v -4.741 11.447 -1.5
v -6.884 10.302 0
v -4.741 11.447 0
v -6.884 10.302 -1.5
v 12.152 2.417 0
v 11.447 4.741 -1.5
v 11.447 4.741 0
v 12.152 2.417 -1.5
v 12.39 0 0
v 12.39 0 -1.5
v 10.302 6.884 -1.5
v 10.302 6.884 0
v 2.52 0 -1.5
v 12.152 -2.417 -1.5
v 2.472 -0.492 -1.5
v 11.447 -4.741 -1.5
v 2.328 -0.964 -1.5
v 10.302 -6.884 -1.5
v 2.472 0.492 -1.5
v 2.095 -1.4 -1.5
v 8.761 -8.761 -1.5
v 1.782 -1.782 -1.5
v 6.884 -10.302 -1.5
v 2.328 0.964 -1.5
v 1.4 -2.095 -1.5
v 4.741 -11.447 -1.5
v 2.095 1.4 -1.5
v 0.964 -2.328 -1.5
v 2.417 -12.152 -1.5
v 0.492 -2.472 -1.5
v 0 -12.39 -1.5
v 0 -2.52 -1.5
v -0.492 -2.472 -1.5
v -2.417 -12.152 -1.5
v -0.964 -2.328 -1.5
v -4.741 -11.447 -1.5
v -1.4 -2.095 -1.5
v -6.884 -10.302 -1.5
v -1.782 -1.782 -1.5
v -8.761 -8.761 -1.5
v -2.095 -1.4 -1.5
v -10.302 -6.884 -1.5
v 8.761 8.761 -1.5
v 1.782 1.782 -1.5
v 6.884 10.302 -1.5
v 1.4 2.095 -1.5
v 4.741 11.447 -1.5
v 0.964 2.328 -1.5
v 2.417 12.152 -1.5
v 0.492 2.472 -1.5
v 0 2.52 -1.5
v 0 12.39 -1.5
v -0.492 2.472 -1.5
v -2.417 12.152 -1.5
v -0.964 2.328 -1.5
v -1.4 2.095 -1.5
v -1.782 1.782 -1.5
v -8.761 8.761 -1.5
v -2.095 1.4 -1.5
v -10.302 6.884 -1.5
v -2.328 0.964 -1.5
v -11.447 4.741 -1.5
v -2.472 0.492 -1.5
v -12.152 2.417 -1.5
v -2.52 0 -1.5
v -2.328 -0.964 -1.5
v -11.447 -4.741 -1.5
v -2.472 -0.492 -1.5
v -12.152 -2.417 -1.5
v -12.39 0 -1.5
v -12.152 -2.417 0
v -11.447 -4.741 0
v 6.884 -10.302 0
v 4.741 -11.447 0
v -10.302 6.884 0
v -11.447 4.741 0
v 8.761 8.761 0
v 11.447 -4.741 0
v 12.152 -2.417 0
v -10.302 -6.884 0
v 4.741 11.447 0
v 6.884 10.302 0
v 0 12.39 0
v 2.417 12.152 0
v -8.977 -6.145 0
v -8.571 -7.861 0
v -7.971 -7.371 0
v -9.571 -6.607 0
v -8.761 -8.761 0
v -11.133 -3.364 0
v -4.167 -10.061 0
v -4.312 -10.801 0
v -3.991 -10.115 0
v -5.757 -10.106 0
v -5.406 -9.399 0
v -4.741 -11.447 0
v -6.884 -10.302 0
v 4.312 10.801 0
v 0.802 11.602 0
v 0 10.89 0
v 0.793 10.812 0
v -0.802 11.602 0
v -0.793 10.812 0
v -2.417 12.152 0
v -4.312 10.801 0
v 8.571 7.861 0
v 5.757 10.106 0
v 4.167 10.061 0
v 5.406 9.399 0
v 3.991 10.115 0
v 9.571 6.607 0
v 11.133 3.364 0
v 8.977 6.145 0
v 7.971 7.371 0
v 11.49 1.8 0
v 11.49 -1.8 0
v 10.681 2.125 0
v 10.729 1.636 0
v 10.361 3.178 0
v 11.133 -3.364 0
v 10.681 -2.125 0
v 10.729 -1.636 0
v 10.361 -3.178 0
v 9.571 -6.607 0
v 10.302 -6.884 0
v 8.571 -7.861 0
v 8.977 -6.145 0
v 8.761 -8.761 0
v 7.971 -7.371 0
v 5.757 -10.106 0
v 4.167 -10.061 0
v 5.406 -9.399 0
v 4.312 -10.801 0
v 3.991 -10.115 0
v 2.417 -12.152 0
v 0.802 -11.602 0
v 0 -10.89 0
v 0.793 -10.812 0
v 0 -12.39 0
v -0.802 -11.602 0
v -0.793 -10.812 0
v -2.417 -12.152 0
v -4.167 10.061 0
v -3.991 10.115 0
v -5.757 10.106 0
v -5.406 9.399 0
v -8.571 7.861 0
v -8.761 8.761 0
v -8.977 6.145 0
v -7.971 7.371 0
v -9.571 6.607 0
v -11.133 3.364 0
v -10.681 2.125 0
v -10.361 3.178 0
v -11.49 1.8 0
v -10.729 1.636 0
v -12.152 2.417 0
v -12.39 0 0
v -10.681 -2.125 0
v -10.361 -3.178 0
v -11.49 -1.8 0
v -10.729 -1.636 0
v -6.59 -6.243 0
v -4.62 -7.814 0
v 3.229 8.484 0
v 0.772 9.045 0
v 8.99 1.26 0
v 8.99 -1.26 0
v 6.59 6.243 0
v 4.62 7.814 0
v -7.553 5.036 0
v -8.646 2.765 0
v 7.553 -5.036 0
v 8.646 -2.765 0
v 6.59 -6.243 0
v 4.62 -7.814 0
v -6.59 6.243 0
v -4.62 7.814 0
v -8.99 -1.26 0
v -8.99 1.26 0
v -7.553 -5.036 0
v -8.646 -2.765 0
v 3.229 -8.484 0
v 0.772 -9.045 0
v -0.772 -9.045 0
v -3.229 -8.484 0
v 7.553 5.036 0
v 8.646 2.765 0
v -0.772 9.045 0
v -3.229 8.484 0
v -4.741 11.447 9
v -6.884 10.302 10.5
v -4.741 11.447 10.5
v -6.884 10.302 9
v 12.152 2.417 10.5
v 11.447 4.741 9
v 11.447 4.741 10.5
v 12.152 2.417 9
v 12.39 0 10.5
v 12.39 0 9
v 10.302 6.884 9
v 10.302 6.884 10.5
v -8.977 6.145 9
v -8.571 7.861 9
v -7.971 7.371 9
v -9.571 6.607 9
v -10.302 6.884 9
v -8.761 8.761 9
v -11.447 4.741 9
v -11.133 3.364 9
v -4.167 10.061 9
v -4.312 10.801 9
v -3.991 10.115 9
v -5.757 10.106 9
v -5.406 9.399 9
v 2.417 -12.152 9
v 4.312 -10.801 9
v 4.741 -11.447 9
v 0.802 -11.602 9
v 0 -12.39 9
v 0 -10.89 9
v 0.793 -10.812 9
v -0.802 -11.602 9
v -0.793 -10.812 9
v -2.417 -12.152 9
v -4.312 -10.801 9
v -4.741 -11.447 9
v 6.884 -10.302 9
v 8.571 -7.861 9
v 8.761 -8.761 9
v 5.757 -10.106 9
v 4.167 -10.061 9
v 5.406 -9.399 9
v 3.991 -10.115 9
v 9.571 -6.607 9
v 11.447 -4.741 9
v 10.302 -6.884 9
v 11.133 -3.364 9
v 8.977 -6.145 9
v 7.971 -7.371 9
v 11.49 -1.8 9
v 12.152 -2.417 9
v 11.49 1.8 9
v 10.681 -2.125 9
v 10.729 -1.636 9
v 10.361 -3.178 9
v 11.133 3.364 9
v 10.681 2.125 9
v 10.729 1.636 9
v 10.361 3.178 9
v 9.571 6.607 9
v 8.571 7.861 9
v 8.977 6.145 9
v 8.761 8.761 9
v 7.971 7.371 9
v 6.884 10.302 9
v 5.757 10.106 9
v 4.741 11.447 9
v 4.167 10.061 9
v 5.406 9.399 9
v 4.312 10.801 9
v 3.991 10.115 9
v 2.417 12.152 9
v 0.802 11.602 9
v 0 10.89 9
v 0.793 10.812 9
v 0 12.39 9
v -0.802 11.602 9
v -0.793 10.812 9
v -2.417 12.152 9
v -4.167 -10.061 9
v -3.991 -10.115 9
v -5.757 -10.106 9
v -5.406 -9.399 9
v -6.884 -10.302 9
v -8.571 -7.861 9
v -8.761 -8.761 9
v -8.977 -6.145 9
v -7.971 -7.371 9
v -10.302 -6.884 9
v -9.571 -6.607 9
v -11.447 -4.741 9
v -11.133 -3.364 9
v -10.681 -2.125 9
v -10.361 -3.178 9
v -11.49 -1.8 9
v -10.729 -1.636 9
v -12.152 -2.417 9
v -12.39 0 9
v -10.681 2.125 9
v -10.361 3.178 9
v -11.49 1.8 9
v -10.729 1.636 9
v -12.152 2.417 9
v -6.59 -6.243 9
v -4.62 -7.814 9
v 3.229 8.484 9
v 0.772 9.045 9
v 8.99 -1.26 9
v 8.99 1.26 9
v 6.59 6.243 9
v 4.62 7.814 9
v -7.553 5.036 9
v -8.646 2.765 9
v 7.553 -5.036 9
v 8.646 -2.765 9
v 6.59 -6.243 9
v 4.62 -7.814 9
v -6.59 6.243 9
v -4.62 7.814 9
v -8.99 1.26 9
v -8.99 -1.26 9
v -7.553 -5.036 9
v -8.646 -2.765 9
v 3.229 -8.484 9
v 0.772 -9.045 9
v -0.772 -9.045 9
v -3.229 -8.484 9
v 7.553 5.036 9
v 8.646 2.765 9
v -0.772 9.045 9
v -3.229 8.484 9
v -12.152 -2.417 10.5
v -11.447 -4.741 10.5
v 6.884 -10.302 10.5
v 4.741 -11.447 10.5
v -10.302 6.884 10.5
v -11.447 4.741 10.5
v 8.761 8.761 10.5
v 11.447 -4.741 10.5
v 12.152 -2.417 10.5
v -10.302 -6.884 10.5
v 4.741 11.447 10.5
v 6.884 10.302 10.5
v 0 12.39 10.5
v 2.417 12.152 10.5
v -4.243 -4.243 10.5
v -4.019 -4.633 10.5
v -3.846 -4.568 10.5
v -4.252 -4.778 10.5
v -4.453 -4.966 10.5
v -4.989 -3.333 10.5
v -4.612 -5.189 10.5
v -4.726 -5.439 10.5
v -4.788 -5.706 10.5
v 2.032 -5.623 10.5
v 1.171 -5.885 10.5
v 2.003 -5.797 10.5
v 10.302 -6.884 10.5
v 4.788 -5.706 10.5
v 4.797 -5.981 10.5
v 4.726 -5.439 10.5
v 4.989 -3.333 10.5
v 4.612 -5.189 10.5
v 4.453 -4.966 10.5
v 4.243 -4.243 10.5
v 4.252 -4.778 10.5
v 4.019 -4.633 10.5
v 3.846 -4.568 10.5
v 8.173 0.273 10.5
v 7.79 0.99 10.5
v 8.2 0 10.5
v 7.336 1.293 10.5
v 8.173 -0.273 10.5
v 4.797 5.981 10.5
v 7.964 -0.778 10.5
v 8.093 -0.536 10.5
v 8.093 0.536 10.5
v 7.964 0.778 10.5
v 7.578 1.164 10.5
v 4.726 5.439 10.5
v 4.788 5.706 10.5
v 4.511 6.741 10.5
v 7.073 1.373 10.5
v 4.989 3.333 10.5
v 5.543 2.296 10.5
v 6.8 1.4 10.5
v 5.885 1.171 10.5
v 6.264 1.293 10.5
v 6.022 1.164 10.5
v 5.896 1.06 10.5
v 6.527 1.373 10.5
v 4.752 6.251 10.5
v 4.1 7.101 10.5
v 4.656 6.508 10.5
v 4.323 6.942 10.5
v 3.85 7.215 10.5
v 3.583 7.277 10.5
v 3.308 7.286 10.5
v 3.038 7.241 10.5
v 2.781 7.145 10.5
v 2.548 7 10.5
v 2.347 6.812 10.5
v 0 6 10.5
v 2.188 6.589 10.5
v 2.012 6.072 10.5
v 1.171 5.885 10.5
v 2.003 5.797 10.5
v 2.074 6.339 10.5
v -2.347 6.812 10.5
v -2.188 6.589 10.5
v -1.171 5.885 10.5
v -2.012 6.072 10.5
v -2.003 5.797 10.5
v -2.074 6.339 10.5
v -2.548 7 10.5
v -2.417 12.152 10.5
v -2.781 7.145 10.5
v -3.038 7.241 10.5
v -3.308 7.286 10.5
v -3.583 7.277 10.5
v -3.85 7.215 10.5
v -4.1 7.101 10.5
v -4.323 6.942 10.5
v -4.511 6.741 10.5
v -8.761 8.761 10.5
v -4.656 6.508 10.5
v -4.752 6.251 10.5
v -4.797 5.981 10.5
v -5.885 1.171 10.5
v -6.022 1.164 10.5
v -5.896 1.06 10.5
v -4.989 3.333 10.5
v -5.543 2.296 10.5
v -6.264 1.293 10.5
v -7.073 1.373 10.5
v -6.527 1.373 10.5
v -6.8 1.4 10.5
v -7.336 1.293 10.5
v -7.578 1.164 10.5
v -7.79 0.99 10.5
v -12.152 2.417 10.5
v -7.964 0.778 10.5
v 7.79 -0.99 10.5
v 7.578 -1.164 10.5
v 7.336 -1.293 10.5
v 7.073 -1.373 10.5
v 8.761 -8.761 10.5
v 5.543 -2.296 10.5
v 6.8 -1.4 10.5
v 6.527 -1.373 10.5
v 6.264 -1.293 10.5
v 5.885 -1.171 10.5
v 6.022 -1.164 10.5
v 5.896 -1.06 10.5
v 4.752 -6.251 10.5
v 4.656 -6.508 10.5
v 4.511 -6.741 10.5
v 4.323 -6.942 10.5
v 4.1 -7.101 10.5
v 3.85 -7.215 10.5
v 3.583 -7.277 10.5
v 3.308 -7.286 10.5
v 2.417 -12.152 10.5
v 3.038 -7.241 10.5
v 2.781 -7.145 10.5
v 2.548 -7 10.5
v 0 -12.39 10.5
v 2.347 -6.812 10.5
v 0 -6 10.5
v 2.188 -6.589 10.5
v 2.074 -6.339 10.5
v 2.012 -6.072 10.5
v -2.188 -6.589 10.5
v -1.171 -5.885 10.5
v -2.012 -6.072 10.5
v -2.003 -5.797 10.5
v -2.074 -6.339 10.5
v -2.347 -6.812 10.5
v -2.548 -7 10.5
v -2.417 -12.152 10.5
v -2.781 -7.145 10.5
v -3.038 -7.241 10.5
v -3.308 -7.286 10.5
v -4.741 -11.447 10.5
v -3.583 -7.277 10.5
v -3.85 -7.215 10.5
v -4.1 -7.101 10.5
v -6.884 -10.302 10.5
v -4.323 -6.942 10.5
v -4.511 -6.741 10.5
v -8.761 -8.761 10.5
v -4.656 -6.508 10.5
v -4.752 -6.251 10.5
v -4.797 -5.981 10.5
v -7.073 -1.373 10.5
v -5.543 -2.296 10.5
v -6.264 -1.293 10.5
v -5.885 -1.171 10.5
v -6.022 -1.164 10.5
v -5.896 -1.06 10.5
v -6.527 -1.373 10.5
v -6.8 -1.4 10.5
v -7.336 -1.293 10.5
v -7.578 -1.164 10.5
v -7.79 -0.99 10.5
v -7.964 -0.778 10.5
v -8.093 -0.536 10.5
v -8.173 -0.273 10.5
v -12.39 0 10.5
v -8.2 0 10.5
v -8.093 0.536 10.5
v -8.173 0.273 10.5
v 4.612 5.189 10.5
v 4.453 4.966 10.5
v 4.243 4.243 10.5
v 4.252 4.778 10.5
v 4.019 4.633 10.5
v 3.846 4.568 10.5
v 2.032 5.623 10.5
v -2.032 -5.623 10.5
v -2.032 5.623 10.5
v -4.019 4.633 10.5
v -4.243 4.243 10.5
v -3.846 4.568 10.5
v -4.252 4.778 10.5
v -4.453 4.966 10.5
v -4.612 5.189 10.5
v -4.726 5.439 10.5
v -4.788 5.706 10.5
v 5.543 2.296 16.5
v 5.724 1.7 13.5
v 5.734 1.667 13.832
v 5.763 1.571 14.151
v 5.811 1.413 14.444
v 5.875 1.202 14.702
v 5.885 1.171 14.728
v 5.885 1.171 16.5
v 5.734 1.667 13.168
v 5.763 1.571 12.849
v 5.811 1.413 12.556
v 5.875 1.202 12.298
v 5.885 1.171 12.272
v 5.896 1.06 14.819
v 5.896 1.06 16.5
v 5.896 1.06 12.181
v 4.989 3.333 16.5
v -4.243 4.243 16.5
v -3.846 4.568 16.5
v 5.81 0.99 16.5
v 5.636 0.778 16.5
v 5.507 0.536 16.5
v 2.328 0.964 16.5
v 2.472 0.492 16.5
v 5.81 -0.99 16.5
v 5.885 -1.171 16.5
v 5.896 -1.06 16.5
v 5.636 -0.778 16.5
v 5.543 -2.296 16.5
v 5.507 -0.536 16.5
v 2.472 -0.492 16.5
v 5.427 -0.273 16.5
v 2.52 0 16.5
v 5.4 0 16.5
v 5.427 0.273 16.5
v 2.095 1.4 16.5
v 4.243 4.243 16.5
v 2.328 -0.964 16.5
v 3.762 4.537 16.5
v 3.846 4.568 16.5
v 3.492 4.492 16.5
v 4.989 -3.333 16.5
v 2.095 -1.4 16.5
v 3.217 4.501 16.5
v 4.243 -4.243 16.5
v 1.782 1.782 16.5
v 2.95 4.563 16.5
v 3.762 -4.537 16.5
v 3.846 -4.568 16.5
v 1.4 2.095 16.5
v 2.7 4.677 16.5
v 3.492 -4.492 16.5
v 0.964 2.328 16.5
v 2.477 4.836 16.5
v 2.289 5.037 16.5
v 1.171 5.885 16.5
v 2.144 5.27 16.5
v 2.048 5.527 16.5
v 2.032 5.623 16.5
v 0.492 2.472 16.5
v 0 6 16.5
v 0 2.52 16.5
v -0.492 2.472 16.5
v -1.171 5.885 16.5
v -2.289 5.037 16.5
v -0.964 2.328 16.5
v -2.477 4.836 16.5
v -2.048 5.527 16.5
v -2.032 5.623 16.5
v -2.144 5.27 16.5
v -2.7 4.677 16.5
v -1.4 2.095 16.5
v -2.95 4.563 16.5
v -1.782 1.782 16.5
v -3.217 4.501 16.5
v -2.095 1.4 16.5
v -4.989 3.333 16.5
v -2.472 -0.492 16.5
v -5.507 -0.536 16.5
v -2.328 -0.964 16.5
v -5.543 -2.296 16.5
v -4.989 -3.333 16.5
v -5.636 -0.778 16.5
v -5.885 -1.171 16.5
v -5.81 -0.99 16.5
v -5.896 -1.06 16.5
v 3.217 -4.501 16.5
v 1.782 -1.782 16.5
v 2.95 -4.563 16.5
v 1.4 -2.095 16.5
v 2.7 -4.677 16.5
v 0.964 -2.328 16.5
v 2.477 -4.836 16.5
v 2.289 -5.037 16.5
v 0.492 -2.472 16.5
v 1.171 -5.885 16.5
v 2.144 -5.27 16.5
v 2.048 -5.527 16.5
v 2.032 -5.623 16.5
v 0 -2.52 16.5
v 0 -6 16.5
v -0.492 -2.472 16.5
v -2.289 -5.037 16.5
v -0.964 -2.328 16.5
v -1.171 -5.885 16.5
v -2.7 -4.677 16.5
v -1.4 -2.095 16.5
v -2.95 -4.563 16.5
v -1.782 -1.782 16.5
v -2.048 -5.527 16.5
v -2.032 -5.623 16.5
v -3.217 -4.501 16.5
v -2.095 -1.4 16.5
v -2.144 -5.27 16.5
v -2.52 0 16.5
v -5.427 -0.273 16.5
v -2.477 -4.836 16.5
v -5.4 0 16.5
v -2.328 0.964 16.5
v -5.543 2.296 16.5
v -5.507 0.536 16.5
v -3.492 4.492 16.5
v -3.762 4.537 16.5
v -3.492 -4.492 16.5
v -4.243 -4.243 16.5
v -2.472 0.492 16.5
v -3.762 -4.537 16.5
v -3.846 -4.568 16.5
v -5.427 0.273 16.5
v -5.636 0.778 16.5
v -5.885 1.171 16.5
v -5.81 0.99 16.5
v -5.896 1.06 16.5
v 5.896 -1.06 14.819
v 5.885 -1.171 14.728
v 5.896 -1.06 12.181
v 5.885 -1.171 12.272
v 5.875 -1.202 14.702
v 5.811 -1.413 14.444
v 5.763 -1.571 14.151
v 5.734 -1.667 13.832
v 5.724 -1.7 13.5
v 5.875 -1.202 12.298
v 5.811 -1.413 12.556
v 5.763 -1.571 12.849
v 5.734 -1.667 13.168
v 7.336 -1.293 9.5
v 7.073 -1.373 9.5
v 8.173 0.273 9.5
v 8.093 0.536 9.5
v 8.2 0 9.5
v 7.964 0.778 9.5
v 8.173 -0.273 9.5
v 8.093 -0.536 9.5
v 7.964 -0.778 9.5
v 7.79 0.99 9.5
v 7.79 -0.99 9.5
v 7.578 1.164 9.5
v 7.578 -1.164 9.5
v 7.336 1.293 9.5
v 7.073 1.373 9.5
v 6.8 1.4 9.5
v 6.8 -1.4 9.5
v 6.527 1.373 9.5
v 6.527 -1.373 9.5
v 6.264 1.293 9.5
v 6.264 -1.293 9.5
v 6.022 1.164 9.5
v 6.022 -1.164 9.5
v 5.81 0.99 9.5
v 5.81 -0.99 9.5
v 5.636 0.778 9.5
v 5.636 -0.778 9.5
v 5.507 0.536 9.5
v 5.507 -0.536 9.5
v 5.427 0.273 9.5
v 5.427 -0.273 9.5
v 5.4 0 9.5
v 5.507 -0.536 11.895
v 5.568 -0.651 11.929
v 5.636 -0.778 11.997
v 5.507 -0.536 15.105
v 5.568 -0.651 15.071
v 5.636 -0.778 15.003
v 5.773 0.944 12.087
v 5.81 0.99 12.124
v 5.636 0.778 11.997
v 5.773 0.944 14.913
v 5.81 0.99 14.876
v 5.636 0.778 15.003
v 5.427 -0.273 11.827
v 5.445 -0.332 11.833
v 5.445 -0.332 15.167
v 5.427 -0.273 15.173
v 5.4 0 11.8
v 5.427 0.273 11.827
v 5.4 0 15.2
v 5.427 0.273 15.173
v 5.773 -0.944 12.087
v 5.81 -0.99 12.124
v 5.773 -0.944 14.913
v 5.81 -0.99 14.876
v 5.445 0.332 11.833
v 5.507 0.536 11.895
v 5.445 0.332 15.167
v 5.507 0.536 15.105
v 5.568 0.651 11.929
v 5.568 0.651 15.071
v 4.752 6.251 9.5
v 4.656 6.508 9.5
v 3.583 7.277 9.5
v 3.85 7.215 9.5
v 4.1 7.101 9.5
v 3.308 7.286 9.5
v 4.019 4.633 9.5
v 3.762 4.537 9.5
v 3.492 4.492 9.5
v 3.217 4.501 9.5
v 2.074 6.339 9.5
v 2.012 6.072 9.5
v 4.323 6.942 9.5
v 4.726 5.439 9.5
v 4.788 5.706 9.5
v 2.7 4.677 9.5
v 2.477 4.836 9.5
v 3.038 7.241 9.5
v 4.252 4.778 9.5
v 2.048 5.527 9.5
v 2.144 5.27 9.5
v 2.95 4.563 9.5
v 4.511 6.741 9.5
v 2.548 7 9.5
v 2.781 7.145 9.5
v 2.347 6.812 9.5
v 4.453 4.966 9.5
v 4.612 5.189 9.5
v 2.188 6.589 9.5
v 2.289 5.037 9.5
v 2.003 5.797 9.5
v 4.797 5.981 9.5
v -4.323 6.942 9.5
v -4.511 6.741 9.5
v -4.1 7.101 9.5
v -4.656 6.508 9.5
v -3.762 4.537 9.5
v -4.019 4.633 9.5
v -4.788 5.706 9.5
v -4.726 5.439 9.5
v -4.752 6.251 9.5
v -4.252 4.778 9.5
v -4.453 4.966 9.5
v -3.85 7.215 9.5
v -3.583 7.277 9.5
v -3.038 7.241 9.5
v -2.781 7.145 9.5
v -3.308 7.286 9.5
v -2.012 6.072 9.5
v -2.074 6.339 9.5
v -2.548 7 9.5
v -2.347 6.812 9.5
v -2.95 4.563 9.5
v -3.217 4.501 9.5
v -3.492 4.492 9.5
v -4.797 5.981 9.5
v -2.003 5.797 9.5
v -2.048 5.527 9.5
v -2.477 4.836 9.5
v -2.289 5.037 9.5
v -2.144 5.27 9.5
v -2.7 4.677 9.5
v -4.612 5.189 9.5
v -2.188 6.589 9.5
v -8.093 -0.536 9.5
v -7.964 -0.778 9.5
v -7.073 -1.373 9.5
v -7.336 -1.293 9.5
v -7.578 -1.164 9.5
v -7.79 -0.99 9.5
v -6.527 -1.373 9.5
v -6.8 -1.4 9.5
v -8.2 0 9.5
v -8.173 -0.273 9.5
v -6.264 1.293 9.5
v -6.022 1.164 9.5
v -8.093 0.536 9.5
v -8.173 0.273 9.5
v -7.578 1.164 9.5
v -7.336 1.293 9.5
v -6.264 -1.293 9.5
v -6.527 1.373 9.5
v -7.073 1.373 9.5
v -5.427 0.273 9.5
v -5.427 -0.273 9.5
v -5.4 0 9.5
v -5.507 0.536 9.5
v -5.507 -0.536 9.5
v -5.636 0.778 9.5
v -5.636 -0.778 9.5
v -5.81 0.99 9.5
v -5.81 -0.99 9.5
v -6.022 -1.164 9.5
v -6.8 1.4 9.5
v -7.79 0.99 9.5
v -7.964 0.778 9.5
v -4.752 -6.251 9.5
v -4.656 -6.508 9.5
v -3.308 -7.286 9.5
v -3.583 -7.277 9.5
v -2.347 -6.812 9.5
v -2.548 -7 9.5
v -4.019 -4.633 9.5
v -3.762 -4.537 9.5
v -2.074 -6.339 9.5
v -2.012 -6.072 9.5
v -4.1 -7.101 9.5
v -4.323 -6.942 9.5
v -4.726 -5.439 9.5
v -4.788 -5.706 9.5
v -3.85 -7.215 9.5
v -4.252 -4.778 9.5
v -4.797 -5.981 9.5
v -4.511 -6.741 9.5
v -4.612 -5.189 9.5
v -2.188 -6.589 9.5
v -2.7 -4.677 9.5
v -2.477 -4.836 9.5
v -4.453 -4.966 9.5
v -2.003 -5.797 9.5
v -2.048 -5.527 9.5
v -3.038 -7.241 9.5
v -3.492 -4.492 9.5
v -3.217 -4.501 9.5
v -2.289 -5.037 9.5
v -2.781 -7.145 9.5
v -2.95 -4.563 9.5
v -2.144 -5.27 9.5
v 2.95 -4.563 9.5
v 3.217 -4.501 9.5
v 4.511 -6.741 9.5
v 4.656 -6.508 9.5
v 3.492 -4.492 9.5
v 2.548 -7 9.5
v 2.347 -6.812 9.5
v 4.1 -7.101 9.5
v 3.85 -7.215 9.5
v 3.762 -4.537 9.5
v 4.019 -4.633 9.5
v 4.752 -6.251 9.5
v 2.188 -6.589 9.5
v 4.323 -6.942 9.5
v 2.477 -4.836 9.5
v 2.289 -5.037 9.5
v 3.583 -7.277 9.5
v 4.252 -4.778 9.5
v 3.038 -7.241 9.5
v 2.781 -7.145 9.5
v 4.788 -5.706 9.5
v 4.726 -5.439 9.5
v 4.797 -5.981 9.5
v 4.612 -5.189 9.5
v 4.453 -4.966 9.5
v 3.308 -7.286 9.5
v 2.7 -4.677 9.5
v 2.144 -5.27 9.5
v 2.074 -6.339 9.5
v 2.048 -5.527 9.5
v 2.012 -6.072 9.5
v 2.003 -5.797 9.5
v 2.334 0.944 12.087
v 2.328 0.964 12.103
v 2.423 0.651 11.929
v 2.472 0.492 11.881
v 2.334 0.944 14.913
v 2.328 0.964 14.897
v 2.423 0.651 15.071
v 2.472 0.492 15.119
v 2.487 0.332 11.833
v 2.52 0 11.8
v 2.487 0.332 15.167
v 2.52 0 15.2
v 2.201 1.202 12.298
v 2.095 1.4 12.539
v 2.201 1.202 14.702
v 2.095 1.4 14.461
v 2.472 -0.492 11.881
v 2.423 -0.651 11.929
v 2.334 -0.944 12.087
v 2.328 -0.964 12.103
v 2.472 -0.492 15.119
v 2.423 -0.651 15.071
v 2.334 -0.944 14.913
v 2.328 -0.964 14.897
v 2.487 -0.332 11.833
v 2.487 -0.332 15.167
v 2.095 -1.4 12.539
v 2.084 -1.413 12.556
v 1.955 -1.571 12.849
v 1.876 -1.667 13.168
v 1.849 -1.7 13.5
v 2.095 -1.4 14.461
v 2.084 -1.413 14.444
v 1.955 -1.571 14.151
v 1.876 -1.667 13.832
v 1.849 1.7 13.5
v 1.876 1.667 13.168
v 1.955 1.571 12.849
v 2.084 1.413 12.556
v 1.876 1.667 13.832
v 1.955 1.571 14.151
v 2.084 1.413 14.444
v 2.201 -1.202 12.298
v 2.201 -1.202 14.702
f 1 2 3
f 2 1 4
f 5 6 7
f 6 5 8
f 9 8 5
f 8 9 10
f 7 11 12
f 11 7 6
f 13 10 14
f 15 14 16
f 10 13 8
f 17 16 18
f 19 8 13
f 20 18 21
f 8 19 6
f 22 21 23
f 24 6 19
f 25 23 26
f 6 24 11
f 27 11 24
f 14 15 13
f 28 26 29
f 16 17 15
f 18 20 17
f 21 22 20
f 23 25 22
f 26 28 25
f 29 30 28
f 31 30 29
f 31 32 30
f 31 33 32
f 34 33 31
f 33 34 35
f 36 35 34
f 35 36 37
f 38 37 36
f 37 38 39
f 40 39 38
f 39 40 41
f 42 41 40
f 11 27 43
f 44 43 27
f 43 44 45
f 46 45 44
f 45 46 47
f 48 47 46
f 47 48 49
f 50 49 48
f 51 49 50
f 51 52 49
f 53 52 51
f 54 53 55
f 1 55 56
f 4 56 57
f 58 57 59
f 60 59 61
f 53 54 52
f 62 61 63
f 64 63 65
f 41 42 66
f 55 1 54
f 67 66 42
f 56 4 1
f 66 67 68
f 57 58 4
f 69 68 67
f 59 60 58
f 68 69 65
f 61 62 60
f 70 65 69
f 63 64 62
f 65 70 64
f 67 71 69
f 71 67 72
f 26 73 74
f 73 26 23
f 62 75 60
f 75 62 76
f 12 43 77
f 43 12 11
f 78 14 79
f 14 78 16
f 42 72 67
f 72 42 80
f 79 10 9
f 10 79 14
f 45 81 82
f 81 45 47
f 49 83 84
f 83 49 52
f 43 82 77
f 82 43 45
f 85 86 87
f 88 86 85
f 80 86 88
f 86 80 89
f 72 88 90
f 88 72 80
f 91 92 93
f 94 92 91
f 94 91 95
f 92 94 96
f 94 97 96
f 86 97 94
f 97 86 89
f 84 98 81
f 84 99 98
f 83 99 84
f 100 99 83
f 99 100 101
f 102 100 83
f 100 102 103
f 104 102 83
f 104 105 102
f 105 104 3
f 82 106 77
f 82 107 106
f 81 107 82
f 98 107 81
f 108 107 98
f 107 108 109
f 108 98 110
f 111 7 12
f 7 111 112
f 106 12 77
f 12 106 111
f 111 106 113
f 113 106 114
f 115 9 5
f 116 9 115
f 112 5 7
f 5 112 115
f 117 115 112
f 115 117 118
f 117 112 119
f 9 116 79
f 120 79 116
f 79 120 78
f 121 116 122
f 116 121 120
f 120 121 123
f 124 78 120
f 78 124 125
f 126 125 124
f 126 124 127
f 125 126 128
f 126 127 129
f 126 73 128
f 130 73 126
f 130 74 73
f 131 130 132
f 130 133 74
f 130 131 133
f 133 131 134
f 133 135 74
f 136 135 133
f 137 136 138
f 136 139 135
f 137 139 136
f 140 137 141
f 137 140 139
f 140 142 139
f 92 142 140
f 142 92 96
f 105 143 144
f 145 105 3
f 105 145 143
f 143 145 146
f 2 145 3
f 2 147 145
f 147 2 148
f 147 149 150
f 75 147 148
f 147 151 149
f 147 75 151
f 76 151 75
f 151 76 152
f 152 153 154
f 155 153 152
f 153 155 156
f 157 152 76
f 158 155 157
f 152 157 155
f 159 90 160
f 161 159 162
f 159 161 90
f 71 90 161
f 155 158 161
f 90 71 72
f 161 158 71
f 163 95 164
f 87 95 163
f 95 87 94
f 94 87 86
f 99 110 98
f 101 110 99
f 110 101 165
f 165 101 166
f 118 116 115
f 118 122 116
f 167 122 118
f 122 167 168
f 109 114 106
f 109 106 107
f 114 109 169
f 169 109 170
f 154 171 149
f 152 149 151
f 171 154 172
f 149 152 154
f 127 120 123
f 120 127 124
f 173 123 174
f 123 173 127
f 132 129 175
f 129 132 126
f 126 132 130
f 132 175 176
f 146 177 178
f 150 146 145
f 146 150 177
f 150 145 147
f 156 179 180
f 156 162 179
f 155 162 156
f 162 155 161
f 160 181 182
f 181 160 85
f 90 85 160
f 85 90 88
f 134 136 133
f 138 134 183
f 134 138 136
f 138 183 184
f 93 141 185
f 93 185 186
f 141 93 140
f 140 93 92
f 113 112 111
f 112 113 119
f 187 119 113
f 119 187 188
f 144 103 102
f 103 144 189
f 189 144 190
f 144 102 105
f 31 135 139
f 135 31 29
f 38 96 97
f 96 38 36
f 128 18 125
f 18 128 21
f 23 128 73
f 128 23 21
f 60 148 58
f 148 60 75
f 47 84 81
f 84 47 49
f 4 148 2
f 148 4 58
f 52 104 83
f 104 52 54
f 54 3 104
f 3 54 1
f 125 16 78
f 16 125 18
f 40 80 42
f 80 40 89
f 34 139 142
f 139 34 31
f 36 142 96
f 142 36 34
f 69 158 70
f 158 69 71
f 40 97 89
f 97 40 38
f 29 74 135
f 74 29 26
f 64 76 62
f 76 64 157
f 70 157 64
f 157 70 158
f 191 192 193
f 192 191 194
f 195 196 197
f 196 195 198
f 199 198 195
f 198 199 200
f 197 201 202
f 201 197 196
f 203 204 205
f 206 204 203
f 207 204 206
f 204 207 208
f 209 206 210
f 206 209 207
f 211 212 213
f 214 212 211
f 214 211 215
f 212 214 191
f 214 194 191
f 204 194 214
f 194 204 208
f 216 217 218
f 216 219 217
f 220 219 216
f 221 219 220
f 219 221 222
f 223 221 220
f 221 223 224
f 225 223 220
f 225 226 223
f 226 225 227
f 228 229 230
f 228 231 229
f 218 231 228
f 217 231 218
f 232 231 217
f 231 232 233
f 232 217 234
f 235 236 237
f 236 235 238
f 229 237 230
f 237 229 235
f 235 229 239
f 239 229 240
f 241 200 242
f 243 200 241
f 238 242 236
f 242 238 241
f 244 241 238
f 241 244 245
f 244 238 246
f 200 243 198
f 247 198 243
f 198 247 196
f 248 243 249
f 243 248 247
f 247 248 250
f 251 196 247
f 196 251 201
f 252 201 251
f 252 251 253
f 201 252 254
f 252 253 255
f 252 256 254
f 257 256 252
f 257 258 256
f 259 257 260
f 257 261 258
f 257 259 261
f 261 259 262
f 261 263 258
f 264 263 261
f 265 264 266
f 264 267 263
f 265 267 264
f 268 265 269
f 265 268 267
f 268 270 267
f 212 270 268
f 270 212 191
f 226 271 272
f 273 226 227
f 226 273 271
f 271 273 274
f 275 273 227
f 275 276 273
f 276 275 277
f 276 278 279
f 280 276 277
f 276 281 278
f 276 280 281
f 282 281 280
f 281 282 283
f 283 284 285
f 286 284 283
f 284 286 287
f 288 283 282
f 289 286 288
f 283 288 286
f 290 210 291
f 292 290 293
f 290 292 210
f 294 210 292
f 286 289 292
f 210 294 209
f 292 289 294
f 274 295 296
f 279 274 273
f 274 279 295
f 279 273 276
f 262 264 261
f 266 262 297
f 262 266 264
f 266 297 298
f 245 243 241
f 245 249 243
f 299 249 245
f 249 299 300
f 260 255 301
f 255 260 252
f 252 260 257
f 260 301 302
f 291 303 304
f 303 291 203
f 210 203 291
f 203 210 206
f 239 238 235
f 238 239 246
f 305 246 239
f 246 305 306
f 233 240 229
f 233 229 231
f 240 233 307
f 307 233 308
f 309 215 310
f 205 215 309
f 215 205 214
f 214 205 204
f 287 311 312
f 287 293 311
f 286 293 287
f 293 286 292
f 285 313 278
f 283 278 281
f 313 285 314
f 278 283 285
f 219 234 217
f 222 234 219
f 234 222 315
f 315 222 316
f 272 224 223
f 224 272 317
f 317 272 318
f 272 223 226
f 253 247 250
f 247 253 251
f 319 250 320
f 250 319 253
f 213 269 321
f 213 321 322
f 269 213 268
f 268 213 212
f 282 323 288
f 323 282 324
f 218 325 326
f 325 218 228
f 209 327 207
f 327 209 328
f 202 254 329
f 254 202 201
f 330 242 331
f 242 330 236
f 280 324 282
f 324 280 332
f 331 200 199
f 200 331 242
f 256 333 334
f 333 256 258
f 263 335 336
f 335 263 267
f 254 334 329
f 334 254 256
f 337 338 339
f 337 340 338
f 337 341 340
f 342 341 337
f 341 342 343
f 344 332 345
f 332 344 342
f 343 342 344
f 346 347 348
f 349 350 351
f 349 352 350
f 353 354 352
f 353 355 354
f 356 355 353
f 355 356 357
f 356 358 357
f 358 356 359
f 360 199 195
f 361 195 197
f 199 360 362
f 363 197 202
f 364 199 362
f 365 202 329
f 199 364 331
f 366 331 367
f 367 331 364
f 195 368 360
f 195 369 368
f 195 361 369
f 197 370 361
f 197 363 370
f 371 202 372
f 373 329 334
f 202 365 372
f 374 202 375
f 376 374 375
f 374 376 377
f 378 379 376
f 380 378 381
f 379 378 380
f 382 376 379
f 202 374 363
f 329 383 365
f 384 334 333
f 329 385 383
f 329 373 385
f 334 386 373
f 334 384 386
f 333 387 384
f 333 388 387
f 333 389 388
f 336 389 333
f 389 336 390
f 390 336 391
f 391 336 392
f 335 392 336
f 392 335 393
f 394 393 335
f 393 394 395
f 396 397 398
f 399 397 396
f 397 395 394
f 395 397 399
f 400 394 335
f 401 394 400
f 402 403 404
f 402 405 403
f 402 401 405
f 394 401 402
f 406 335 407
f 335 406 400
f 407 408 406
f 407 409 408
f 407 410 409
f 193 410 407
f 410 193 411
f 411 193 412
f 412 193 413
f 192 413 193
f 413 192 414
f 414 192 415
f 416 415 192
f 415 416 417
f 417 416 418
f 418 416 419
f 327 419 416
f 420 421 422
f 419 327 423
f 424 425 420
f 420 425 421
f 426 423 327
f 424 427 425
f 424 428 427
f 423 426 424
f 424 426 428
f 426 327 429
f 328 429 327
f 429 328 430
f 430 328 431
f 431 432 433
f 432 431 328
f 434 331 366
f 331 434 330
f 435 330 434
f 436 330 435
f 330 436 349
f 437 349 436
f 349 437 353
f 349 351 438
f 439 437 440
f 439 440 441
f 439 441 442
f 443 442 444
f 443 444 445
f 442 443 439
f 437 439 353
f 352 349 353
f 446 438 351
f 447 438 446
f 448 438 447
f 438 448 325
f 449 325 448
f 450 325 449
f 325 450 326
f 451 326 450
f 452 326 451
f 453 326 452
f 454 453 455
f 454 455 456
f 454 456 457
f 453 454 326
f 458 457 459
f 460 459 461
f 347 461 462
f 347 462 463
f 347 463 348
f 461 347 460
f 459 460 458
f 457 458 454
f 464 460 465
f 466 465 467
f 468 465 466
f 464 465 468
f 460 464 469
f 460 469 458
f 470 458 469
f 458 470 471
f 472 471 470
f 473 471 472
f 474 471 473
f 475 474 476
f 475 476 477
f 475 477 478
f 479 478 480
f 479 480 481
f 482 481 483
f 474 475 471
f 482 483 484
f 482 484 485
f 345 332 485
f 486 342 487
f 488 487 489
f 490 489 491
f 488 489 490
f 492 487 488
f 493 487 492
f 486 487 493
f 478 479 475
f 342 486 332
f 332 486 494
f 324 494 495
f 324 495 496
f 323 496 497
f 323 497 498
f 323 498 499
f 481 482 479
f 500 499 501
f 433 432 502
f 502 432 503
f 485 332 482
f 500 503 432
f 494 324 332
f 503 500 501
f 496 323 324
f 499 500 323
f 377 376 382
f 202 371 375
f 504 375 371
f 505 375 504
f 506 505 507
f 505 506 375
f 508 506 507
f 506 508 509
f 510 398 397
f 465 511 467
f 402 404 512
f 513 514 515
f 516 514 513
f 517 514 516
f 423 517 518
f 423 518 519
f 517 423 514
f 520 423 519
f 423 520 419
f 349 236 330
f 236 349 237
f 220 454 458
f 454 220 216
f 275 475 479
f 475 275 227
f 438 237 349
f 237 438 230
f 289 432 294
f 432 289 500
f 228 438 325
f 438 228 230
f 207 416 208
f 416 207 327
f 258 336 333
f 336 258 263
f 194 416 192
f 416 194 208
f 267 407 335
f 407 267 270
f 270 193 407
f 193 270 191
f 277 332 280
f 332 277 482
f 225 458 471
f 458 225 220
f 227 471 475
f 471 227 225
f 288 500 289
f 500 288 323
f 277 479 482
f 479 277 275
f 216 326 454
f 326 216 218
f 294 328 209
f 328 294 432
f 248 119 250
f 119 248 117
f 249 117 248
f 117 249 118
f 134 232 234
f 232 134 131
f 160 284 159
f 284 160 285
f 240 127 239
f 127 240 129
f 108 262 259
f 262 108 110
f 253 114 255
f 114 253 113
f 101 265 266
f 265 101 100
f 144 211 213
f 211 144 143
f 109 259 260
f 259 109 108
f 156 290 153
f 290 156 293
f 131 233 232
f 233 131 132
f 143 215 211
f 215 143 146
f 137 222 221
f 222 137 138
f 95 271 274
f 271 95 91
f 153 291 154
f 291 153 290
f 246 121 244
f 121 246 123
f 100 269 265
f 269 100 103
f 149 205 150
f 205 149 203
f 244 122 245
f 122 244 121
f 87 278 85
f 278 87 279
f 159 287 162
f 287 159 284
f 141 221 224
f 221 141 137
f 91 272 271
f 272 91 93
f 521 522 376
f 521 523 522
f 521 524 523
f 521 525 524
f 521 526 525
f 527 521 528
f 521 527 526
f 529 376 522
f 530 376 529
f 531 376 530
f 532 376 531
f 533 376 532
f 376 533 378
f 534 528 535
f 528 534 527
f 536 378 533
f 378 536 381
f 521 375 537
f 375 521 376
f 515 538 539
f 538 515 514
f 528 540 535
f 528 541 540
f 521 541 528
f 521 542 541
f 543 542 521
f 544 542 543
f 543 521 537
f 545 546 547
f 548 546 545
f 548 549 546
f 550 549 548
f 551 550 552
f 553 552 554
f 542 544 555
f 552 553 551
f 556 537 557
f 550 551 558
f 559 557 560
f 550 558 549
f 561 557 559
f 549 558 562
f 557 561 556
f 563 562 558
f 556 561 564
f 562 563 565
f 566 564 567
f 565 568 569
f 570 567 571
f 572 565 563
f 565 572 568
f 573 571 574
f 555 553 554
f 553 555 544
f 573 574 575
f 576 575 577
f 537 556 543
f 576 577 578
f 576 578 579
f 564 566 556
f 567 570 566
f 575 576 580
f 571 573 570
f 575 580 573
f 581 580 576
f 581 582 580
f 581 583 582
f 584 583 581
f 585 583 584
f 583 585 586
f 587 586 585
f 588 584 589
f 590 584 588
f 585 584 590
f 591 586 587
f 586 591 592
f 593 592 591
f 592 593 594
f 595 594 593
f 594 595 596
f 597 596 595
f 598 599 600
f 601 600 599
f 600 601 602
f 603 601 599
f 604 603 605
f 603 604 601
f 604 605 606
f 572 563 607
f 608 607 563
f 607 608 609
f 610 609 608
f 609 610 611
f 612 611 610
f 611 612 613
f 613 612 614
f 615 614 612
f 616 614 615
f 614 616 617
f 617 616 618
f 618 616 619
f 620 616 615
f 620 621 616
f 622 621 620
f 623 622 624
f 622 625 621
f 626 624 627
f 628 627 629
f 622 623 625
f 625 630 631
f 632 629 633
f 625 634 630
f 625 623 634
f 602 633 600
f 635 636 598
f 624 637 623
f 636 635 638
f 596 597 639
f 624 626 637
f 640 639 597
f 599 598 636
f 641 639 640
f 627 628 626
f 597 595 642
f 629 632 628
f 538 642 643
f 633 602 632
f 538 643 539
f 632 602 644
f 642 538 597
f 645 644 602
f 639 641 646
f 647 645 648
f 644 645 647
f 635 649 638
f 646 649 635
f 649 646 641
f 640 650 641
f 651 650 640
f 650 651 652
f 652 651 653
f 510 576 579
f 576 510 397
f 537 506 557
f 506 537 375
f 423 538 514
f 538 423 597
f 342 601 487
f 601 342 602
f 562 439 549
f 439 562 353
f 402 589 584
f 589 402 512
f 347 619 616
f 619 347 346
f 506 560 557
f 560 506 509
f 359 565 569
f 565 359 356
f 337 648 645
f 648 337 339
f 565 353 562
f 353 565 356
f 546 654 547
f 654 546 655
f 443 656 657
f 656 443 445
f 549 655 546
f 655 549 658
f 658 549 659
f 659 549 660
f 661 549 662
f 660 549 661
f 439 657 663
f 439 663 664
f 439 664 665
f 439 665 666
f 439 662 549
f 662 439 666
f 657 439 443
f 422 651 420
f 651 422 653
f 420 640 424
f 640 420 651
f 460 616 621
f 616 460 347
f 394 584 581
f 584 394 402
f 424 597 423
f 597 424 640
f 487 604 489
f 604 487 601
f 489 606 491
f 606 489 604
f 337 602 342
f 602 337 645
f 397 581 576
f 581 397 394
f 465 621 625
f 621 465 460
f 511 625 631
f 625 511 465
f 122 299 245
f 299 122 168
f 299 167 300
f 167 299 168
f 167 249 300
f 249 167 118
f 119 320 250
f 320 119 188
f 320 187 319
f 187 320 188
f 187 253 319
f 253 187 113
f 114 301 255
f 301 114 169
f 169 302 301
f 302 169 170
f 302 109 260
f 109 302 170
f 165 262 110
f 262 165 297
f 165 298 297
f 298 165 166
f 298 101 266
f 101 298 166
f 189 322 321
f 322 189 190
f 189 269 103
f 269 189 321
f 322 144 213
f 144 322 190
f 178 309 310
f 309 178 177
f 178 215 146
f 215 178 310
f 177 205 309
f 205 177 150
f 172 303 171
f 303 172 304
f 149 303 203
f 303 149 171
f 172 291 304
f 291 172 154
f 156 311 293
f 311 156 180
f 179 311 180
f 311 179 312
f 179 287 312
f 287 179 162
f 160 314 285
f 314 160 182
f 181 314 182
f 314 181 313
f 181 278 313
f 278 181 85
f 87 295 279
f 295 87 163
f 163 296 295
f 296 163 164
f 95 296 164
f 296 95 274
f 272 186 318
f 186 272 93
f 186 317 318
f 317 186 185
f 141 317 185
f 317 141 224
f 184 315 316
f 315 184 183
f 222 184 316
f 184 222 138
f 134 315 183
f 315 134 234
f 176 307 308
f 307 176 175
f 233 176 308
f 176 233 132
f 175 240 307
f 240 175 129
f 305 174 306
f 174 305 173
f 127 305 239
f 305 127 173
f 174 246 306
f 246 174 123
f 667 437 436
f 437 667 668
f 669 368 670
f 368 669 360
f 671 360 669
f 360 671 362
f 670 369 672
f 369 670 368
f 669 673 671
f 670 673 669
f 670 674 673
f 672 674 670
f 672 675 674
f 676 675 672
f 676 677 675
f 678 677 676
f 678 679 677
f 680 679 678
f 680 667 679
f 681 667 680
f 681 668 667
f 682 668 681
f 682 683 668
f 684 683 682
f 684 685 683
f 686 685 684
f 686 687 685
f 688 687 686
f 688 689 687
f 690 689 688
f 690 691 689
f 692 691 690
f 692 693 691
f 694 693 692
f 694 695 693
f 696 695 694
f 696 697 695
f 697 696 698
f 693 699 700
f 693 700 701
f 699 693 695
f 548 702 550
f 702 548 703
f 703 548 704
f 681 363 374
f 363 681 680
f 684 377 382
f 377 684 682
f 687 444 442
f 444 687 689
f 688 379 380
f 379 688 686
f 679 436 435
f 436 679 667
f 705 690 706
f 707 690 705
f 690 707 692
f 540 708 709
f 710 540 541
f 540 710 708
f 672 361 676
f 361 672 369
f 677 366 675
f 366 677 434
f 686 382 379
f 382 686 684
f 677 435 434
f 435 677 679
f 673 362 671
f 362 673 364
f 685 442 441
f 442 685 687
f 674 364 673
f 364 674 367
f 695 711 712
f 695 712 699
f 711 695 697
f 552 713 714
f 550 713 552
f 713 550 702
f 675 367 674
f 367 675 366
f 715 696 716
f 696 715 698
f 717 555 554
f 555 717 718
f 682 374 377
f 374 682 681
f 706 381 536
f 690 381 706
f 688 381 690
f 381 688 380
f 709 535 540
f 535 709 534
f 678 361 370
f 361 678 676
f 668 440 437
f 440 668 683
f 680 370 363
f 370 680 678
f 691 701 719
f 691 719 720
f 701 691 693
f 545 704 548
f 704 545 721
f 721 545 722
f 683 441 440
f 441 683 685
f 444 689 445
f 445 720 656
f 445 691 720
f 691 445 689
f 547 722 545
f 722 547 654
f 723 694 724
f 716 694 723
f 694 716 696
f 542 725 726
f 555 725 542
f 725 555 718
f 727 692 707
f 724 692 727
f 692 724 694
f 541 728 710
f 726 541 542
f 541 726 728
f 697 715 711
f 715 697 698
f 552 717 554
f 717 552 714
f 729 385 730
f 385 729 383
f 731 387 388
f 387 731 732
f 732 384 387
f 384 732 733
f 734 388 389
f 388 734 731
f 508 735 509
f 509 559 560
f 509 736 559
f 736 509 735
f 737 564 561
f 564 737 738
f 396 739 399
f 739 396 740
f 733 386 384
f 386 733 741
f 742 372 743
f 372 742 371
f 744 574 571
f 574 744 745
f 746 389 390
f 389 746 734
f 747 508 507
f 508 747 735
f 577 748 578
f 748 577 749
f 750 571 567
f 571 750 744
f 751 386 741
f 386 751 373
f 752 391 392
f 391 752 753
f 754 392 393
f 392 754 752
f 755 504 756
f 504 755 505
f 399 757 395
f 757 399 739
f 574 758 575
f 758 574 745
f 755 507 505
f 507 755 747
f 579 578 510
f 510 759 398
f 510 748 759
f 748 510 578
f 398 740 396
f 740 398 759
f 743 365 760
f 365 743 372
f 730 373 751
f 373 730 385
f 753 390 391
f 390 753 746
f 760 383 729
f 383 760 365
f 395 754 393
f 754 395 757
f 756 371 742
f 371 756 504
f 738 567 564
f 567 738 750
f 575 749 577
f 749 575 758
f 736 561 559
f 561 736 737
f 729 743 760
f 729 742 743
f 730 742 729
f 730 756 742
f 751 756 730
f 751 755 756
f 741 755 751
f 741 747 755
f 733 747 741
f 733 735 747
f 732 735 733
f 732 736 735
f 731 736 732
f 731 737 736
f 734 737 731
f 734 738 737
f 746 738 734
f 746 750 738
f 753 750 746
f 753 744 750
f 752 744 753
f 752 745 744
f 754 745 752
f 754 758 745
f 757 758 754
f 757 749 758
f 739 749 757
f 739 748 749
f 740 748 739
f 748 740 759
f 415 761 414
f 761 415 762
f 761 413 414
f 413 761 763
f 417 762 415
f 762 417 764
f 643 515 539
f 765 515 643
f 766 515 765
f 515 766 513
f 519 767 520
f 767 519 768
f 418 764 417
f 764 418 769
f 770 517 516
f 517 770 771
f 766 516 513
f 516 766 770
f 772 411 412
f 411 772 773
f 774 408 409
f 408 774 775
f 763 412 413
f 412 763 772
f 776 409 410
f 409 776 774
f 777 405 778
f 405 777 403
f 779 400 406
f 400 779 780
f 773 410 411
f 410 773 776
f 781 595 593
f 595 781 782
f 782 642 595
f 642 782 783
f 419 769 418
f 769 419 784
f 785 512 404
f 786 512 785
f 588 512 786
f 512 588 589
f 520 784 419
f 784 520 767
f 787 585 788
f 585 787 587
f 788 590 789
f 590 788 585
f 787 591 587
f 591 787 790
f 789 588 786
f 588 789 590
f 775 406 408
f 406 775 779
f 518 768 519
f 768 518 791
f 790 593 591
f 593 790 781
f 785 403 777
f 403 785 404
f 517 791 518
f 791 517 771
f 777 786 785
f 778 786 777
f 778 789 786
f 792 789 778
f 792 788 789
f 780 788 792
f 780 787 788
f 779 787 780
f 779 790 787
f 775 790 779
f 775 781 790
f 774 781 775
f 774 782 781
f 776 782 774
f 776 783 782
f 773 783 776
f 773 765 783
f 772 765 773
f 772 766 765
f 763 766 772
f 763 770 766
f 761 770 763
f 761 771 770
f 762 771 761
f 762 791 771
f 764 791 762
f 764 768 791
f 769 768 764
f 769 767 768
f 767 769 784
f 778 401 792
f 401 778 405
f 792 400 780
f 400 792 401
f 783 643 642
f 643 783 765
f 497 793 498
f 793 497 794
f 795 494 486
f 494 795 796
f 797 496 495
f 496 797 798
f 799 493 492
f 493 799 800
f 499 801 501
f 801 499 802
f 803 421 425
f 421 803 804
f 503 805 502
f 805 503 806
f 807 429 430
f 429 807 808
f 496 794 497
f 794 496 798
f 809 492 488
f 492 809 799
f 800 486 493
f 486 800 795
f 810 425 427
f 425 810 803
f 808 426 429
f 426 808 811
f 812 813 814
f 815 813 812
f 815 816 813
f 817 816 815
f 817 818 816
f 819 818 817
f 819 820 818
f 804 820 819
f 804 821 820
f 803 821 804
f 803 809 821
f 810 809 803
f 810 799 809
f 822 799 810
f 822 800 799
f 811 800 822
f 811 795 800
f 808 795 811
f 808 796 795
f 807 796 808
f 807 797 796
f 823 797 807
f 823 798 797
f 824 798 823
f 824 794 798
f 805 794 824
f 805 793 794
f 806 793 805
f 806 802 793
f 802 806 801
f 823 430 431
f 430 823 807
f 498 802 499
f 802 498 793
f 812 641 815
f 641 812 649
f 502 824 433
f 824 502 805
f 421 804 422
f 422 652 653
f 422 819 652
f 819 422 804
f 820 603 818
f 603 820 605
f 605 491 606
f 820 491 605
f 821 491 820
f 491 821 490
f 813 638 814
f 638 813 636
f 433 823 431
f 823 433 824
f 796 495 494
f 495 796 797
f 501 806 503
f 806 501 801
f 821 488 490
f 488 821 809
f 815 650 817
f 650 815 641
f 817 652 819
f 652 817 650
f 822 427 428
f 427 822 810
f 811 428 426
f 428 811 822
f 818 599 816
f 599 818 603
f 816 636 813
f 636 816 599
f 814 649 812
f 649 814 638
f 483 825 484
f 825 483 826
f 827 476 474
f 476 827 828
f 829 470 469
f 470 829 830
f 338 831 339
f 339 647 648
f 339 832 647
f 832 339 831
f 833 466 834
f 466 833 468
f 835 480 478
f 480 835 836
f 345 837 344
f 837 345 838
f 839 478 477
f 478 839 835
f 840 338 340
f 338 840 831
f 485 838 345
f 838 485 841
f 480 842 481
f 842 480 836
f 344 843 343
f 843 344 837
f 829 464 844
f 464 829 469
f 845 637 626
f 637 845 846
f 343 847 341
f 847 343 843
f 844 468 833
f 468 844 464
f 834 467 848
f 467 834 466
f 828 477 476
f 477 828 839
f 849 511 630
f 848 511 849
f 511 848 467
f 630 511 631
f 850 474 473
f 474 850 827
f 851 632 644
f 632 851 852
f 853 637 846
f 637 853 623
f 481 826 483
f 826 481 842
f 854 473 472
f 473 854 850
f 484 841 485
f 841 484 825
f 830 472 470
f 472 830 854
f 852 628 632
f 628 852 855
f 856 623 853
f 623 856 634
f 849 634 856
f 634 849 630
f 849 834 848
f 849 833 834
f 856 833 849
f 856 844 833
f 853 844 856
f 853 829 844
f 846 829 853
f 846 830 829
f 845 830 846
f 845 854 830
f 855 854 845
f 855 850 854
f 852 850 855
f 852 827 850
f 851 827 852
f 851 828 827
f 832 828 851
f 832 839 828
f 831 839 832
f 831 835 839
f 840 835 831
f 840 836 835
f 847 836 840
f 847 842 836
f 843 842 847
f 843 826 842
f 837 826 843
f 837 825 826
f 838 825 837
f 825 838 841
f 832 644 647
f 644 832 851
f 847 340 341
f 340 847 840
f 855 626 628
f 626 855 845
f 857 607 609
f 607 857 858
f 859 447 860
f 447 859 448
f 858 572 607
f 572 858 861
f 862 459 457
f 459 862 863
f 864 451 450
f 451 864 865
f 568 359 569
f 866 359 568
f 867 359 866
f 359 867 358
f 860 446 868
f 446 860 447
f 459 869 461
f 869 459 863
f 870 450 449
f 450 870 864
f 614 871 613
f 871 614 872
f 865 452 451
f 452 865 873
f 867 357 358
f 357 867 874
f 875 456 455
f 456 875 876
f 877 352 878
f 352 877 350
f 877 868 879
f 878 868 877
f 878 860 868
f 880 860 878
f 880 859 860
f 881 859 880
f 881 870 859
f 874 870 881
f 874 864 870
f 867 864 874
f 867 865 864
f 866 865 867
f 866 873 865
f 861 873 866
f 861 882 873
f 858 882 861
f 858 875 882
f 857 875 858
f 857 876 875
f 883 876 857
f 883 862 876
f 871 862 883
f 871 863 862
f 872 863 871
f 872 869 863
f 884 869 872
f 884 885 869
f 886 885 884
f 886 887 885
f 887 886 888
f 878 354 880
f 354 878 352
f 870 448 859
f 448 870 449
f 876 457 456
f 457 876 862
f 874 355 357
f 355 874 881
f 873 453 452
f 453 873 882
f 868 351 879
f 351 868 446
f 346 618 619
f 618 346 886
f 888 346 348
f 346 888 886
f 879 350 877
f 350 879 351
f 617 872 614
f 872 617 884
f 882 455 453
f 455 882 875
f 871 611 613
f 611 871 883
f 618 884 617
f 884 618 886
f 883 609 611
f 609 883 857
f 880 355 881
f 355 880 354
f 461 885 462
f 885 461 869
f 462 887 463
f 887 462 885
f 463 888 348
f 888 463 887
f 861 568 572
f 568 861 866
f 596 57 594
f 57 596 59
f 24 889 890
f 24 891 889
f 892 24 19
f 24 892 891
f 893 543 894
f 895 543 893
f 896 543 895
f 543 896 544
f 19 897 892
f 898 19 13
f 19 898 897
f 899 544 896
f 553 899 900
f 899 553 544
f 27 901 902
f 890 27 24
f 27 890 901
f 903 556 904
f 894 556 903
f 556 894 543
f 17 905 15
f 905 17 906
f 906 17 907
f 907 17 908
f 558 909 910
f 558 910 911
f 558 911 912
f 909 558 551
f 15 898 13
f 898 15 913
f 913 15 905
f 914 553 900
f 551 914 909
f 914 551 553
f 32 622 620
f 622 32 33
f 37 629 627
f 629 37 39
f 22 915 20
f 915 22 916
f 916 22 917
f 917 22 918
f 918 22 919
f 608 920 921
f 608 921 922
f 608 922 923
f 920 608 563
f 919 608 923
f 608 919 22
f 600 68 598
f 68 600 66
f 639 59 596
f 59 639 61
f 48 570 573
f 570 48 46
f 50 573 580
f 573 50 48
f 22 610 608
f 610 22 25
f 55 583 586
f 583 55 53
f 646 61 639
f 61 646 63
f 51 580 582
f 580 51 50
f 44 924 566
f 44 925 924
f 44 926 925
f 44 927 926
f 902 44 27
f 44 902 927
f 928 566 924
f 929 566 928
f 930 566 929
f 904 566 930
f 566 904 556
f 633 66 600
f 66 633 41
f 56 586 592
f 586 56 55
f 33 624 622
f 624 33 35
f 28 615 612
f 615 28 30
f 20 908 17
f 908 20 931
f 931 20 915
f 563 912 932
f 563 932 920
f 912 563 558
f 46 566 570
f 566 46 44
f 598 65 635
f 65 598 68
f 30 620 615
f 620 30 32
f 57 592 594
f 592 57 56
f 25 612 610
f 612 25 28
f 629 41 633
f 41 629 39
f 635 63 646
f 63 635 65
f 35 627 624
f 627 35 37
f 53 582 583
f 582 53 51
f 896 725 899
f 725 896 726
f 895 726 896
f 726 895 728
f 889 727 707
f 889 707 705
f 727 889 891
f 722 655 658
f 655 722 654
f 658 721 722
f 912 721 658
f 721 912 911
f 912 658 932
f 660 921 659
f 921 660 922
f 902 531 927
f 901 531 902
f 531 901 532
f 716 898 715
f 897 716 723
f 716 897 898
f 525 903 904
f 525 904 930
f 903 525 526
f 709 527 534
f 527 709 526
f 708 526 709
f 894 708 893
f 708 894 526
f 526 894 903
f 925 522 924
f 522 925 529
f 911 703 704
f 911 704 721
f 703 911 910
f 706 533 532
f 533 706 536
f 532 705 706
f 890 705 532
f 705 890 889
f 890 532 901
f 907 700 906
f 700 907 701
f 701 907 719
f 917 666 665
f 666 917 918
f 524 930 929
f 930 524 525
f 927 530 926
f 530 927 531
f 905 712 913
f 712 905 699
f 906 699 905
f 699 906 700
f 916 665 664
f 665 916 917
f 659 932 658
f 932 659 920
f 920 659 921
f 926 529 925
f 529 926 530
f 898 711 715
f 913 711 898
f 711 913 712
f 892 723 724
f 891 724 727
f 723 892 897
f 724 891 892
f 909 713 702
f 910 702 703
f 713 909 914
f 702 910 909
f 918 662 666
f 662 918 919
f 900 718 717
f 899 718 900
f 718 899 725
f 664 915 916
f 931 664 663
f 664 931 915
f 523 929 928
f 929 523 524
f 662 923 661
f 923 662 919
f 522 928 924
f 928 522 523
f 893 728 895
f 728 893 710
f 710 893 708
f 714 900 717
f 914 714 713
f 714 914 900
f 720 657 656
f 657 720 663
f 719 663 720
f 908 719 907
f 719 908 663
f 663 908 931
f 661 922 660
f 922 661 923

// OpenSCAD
$fn = 32;

// ----------------------------------------------------------------------
// Timing pulley: T5 14T, pitch 5 mm, 24.78 mm x 18 mm
// ----------------------------------------------------------------------

// --- parameters (mm) ---
pitch = 5;                // belt pitch
teeth = 14;               // number of grooves
belt_w = 9;               // belt width between the flanges
tip_d = 21.78;            // tip circle diameter
root_d = 19.18;           // groove bottom diameter
groove_h = 1.3;           // groove depth
tooth_w = 3;              // groove width at the tip circle
flange_d = 24.78;         // flange diameter
flange_t = 1.5;           // flange thickness
spigot_d = 17.58;         // flange spigot, sunk into the rim
spigot_h = 1.2;           // spigot depth into the rim
bore_d = 5.04;            // shaft bore
hub_d = 12;               // hub diameter
hub_h = 6;                // hub above the flange
bottom_z = -1.5;          // lowest point of the pulley
top_z = 16.5;             // highest point of the pulley
set_d = 3.4;              // set screw tap hole
ring_d = 2.8;             // clamp screw hole
ring_r = 6.8;             // clamp screw radius

module rim() {
  cylinder(h = belt_w, d = tip_d);
}

module groove_cutter() {
  /* belt tooth groove: deeper than wide, cut through the belt width */
  translate([root_d / 2, 0, 0])
    linear_extrude(height = belt_w)
      polygon(points = [[-0.6, -tooth_w * 0.42], [groove_h + 0.6, -tooth_w * 0.6],
                        [groove_h + 0.6, tooth_w * 0.6], [-0.6, tooth_w * 0.42]]);
}

module flanges() {
  translate([0, 0, -flange_t]) cylinder(h = flange_t, d = flange_d);
  translate([0, 0, belt_w]) cylinder(h = flange_t, d = flange_d);
  translate([0, 0, -spigot_h]) cylinder(h = spigot_h + 0.6, d = spigot_d);
  translate([0, 0, belt_w - 0.6]) cylinder(h = spigot_h + 0.6, d = spigot_d);
}

module hub() {
  translate([0, 0, bottom_z]) cylinder(h = top_z - bottom_z, d = hub_d);
}

difference() {
  union() {
    rim();
    hub();
    flanges();
  }
  for (i = [0 : teeth - 1]) rotate([0, 0, i * 360 / teeth]) groove_cutter();
  translate([0, 0, bottom_z - 1]) cylinder(h = top_z - bottom_z + 2, d = bore_d);
  translate([-1, 0, top_z - hub_h * 0.5]) rotate([0, 90, 0]) cylinder(h = hub_d / 2 + 3, d = set_d);
  for (i = [0 : 5]) rotate([0, 0, i * 60]) translate([ring_r, 0, top_z - hub_h - 1])
    cylinder(h = hub_h + 2, d = ring_d);
}
